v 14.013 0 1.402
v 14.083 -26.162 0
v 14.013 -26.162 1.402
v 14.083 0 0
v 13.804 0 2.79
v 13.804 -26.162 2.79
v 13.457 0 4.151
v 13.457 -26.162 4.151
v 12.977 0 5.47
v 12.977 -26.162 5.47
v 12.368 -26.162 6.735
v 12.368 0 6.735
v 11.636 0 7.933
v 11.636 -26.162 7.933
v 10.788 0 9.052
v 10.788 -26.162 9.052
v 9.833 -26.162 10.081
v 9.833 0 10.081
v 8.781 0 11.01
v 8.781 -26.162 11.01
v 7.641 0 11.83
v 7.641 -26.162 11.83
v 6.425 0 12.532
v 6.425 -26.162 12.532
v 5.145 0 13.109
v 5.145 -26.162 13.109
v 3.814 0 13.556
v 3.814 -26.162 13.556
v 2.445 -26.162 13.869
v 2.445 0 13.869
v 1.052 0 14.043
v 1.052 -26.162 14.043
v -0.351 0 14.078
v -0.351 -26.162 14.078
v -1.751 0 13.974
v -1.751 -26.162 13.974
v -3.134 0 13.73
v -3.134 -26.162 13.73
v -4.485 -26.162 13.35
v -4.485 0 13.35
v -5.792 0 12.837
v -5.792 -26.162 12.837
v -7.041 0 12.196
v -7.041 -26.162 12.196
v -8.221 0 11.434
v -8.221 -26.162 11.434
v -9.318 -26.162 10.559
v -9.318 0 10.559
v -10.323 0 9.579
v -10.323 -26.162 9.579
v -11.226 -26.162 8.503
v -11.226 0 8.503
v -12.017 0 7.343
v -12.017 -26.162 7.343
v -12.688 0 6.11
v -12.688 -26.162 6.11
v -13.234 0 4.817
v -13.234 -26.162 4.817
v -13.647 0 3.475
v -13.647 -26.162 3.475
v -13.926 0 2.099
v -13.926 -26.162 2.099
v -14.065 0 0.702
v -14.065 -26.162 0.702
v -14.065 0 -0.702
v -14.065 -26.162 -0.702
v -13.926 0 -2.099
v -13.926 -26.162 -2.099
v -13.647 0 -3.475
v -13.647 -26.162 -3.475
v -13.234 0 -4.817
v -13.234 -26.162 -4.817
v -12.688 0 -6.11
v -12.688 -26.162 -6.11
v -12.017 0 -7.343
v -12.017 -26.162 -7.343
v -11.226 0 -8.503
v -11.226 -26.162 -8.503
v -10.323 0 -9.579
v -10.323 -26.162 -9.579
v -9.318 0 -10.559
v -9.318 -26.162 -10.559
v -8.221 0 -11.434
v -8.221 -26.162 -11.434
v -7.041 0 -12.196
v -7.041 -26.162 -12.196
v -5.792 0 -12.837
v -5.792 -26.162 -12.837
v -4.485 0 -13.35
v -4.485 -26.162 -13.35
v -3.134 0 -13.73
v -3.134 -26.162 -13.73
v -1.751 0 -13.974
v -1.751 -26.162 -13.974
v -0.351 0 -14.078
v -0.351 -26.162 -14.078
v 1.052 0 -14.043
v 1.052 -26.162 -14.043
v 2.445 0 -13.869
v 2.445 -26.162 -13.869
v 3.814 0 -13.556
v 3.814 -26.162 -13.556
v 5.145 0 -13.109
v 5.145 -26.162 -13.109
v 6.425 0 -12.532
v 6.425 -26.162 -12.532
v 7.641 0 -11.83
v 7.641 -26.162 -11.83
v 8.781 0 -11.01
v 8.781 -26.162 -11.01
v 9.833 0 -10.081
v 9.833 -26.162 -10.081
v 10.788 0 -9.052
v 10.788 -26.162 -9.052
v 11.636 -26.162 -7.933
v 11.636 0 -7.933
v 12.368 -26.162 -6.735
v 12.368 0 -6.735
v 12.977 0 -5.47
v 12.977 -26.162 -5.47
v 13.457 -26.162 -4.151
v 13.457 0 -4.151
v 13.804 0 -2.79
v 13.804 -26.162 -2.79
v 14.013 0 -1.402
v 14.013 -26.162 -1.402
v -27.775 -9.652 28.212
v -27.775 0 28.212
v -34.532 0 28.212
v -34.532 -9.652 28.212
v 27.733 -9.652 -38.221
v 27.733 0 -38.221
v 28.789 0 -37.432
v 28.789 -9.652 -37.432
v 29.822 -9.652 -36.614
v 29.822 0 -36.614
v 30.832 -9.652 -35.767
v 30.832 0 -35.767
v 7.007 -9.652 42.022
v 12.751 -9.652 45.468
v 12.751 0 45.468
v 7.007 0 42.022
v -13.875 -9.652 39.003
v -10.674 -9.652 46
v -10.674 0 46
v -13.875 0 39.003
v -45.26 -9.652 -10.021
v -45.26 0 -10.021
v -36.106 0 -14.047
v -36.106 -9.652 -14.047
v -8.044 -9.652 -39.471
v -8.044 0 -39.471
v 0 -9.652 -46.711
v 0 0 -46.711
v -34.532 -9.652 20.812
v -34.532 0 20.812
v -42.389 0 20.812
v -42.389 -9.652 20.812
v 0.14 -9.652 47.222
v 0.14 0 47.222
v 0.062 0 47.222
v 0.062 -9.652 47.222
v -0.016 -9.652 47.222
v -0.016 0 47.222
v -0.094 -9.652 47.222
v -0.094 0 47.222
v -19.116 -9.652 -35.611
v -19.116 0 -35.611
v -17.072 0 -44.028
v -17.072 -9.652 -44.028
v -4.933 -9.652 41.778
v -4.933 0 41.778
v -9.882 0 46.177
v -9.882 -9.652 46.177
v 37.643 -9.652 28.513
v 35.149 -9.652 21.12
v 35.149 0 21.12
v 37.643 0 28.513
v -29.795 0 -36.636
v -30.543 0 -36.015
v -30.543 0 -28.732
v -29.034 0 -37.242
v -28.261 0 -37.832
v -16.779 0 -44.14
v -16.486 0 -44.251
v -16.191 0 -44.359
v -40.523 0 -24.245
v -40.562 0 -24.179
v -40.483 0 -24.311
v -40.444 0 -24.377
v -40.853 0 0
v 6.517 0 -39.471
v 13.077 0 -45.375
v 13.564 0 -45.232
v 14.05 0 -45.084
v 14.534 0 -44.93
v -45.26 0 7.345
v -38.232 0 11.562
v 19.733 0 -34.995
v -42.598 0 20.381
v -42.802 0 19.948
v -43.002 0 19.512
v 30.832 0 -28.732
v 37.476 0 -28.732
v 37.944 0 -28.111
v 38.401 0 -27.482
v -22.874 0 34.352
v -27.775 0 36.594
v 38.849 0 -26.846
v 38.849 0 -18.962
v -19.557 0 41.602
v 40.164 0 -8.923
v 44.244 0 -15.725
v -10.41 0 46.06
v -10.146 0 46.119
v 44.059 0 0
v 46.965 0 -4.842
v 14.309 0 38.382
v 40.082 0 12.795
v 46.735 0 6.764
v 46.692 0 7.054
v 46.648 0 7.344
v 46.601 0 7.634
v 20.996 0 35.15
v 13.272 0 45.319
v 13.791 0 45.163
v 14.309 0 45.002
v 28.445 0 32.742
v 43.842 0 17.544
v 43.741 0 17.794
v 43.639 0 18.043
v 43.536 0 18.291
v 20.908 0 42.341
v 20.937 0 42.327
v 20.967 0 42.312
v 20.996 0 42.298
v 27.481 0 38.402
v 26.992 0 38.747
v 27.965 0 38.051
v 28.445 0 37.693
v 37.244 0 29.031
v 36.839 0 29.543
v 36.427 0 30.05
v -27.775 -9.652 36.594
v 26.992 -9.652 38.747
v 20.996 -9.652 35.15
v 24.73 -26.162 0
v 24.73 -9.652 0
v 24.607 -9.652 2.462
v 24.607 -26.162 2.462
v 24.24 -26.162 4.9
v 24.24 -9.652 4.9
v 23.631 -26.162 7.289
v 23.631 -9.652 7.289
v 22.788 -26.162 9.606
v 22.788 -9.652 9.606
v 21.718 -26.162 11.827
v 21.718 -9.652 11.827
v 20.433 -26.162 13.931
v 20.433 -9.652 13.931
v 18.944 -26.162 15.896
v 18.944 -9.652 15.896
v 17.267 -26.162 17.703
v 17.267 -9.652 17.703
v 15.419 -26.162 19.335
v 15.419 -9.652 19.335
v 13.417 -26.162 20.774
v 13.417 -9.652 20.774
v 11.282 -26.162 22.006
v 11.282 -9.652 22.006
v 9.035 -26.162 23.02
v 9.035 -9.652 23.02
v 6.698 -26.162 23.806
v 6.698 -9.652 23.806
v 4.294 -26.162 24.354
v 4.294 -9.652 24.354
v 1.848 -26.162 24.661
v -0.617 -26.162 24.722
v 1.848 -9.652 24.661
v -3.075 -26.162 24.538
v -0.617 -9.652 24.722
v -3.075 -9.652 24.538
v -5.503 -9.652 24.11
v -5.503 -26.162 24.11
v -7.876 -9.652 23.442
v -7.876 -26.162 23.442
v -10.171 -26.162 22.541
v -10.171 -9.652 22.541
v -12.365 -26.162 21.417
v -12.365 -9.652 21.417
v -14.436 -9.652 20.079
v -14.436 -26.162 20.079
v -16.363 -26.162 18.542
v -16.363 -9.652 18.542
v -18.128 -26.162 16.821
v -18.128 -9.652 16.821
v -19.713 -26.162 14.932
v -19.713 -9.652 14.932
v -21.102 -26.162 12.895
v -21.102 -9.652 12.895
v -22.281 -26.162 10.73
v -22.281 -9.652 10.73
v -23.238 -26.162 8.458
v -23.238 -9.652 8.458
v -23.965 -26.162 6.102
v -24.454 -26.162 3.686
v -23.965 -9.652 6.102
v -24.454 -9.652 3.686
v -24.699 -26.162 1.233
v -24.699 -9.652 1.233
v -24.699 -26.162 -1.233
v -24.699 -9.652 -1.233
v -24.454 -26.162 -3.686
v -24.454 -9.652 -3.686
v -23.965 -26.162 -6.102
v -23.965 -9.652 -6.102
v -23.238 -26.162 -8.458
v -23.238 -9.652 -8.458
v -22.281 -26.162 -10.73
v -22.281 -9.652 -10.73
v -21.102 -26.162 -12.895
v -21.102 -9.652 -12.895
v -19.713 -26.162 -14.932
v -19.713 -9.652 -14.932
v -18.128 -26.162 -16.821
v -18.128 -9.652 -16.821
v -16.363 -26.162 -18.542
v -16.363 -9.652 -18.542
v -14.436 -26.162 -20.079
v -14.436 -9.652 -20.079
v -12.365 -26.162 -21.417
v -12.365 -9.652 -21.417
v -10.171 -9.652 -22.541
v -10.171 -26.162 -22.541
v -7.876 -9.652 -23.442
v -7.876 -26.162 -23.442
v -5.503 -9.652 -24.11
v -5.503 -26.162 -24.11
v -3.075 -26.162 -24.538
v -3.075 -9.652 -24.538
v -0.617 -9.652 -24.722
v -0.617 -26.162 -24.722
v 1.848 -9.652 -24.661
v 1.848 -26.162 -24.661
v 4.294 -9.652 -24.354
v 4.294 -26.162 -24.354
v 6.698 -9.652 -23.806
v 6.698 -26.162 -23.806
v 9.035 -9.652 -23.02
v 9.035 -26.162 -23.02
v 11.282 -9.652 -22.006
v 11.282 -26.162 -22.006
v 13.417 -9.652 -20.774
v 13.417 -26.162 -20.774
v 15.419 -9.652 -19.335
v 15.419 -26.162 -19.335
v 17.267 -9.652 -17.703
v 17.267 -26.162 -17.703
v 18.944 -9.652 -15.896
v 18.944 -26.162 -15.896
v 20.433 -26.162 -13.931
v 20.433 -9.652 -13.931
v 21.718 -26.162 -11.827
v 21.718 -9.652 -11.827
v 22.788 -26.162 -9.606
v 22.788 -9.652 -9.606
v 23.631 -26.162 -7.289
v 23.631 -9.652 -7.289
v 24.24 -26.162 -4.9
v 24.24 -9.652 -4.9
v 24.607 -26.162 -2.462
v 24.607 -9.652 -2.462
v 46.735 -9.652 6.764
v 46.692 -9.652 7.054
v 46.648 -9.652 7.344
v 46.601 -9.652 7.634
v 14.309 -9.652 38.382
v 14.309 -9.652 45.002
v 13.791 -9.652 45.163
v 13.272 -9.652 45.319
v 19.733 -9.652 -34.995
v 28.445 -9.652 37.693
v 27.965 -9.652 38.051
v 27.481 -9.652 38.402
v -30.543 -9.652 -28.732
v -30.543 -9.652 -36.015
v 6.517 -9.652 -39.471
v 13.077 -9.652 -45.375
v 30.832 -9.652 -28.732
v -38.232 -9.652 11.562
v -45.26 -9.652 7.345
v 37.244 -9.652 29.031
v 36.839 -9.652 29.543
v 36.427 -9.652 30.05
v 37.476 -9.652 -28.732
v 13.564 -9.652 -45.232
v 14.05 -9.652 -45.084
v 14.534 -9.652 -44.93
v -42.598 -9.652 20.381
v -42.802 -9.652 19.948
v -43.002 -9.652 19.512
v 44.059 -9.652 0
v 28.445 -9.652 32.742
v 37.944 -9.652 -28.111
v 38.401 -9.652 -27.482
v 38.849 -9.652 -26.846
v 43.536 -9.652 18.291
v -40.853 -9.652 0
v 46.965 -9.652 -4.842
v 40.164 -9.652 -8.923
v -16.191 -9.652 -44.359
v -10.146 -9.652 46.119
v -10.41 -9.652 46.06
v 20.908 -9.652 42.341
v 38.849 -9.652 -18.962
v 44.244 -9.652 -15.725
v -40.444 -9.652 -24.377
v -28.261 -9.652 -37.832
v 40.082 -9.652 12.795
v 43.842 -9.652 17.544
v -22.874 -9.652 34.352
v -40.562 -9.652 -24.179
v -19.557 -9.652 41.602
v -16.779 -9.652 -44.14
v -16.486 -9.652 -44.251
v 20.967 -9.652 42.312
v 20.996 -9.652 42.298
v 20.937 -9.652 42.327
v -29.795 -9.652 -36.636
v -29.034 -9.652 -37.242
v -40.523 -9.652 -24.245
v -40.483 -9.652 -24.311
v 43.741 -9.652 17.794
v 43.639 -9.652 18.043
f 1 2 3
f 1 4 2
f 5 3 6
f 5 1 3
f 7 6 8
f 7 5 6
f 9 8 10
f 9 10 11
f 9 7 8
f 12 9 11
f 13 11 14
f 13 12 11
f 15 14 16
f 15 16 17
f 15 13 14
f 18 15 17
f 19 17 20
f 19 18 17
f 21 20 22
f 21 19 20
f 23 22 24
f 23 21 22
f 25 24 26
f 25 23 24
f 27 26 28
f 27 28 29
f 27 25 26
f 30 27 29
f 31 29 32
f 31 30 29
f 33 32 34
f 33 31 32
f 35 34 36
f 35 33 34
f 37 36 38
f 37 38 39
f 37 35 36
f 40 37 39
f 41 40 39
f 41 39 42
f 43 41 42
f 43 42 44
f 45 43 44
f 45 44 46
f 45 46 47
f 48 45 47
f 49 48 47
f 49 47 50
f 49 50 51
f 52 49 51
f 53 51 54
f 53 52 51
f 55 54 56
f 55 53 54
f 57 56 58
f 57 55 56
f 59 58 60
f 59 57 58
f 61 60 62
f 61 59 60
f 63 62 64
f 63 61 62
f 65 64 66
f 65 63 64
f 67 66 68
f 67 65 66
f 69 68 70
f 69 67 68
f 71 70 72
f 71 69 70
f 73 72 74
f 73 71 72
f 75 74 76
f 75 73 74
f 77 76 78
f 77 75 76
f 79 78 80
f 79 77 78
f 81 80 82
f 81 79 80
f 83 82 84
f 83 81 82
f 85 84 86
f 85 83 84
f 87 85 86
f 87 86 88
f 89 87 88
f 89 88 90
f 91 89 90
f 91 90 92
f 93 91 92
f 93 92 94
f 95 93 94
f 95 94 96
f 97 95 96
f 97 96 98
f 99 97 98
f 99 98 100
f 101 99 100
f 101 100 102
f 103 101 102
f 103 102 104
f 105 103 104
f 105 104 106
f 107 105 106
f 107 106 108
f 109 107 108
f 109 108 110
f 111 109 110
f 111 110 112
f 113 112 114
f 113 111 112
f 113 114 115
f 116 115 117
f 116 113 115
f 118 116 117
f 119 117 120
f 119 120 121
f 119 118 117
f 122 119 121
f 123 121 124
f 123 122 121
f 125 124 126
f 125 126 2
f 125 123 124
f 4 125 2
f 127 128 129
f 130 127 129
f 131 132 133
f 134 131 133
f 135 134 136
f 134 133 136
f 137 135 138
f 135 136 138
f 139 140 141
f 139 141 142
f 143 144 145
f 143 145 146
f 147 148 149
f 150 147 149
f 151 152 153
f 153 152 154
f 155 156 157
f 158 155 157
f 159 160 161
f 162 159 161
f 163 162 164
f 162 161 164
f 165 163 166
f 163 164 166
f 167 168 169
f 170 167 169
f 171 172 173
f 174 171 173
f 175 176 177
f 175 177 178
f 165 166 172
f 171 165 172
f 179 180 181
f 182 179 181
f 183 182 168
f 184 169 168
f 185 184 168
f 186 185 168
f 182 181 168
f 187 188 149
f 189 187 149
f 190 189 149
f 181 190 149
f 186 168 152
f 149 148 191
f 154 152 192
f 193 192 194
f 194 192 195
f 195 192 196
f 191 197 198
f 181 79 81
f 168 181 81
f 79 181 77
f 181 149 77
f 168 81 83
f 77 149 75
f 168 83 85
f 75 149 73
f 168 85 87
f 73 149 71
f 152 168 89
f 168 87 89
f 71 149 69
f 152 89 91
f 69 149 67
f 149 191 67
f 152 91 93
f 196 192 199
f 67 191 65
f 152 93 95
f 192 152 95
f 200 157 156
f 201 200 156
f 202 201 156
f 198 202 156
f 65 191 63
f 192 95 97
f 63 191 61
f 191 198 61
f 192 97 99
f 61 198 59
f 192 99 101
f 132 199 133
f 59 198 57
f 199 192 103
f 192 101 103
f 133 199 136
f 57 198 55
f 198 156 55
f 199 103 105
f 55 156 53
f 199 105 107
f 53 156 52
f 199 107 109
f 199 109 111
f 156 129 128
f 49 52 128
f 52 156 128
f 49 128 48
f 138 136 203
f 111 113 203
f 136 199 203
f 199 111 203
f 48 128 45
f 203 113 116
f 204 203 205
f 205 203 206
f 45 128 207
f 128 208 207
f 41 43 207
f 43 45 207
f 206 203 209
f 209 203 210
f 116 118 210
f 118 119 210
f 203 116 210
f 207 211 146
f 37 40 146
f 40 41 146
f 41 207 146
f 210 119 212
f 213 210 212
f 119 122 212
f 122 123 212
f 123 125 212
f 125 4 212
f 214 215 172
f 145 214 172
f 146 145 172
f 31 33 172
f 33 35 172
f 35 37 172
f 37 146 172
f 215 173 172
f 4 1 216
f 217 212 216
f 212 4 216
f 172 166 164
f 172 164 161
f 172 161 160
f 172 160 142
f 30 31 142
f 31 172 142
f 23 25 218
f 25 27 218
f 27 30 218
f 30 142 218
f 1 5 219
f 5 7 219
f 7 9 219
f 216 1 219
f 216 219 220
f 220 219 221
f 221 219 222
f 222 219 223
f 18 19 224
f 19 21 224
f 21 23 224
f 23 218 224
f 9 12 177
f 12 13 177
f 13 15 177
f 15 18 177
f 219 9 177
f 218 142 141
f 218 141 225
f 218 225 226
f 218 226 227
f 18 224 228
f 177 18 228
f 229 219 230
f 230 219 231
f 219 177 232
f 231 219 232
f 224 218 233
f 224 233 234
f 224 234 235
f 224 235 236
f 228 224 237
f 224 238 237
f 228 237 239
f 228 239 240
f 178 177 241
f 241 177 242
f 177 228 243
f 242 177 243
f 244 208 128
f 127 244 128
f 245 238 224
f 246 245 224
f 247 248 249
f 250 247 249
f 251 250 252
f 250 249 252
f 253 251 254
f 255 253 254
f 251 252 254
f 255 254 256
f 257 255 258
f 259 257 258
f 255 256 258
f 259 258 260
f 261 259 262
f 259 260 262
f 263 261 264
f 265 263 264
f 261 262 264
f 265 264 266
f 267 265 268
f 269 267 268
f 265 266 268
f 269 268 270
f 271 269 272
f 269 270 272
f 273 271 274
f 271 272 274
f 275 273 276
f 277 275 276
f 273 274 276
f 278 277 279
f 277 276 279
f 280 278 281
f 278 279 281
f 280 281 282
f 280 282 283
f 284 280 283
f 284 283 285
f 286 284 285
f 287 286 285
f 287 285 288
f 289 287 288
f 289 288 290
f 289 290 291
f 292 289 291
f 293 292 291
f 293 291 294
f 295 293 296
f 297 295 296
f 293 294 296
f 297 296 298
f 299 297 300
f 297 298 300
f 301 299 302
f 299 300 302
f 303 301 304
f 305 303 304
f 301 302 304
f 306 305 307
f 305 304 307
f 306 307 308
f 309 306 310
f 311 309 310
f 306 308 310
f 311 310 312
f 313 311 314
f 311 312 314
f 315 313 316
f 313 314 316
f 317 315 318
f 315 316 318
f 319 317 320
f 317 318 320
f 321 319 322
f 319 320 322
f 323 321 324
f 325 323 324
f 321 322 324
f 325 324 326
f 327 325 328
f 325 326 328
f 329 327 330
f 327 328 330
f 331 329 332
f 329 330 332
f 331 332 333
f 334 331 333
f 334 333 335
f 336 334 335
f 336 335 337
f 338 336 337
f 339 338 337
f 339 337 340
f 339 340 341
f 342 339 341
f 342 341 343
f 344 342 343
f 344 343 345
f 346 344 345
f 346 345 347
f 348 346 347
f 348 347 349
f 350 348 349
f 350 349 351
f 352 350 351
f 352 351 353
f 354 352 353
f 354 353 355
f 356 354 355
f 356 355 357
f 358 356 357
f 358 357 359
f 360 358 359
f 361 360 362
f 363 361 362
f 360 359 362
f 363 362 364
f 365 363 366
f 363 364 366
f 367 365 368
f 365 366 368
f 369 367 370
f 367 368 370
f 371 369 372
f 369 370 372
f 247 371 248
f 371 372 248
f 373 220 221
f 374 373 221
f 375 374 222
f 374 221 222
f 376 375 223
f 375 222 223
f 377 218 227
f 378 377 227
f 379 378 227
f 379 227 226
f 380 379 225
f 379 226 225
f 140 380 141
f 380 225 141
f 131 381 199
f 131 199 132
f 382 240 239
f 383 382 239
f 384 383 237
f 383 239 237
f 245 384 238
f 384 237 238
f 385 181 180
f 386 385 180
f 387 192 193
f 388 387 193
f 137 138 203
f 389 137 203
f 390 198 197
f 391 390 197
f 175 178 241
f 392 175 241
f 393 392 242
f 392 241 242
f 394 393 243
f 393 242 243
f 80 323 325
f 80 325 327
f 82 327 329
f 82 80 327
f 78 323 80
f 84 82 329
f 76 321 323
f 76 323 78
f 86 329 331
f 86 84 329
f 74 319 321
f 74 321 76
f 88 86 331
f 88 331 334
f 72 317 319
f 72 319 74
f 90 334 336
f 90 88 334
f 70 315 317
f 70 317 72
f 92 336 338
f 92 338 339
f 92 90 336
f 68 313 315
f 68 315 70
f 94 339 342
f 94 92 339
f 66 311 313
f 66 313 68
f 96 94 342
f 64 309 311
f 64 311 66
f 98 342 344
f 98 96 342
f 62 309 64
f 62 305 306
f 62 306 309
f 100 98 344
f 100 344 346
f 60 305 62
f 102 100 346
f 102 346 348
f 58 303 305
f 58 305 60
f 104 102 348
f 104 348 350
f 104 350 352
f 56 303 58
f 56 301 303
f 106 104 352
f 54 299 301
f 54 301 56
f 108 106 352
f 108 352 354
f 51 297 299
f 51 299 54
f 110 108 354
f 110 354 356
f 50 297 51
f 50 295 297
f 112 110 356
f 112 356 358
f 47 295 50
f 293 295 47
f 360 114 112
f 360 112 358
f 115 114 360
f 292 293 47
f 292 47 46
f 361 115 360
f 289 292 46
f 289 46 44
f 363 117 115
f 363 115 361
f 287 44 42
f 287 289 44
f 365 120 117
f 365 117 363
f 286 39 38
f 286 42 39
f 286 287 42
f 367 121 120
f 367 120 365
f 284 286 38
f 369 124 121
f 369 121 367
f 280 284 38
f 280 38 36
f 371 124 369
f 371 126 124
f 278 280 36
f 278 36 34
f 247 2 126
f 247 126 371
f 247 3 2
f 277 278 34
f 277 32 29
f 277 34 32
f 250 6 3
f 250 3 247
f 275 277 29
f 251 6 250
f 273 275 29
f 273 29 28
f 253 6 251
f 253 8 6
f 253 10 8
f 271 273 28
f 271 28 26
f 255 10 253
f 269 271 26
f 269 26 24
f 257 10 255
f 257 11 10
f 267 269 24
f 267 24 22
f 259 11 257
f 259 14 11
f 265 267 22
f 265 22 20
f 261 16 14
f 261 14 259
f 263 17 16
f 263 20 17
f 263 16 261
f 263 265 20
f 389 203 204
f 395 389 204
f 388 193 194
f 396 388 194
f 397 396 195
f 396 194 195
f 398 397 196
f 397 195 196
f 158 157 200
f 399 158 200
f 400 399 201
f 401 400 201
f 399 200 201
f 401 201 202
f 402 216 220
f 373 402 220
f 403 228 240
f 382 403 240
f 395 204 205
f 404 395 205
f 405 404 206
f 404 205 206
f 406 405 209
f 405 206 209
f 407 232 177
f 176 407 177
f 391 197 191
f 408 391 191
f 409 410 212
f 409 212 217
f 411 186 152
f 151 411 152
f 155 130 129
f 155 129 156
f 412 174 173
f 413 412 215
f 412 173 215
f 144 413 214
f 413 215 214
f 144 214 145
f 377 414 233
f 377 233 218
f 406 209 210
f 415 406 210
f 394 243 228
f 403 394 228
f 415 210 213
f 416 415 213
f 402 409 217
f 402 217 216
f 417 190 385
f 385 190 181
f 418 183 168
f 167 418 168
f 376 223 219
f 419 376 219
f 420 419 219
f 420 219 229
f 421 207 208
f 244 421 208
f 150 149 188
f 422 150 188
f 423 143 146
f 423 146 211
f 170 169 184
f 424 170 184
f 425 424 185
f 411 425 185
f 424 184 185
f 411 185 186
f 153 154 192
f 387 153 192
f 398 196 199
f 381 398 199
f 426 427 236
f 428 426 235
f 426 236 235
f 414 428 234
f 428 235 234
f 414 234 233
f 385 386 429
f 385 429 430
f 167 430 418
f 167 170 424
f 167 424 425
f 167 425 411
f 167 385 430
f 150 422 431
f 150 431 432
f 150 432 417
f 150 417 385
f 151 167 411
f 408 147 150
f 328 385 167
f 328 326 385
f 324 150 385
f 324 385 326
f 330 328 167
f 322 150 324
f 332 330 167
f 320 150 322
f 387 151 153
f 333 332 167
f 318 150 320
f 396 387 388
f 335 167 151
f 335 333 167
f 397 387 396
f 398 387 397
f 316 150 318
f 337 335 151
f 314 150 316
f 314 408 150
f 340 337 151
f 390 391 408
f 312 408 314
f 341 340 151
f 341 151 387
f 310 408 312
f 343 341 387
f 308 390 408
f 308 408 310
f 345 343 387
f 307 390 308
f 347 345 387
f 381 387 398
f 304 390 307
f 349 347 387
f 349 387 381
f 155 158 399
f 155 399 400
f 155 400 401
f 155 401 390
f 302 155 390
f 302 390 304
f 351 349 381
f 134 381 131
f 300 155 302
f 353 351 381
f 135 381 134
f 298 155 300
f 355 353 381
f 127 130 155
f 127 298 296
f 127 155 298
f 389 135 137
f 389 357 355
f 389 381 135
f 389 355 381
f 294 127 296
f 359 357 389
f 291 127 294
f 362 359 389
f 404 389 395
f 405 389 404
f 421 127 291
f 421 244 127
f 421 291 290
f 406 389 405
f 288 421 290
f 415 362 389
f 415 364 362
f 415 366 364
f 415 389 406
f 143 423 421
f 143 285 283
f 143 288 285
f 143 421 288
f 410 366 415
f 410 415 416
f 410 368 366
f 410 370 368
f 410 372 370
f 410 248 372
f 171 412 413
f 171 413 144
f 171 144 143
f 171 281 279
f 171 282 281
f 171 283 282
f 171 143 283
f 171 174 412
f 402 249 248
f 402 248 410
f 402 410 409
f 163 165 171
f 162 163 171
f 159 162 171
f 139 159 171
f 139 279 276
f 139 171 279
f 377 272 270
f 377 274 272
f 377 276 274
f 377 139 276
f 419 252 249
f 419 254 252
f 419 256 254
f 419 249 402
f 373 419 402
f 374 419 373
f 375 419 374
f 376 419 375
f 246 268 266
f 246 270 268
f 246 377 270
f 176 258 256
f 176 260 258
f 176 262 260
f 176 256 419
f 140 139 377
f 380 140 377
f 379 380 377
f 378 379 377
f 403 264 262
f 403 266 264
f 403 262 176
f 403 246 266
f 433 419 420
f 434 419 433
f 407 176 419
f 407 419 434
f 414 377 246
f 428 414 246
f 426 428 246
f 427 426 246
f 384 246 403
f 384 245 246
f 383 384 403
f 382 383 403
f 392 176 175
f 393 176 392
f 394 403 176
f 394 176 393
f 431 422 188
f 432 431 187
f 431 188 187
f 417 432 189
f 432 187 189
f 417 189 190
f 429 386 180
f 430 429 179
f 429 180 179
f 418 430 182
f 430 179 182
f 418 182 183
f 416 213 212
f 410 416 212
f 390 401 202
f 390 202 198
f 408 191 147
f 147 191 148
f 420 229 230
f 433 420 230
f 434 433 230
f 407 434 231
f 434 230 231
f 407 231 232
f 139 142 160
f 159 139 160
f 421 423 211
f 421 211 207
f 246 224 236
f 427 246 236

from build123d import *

# Parameters (mm, degrees)
F0_R     = 47.222118
F0_R_2   = 26.321979
F0_R_3   = 14.082834
F1_DEPTH = 9.652
F2_R     = 24.729886
F2_R_2   = 14.082834
F3_DEPTH = 16.51
F5_DEPTH = 58.166


with BuildPart() as f1:
    # F0 (on Front) → F1 (new body)
    with BuildSketch(Plane.XZ):
        Circle(F0_R)
        Circle(F0_R_2, mode=Mode.SUBTRACT)
        Circle(F0_R_2)
        Circle(F0_R_3, mode=Mode.SUBTRACT)
    extrude(amount=F1_DEPTH)

    # F2 (on face) → F3 (join)
    with BuildSketch(Plane.XZ.offset(9.652)):
        Circle(F2_R)
        Circle(F2_R_2, mode=Mode.SUBTRACT)
    extrude(amount=F3_DEPTH)

    # F4 (on Front) → F5 (intersect)
    with BuildSketch(Plane.XZ):
        Polygon((7.006876, 42.021585), (0, 47.32769), (-4.933179, 41.77786), (-10.38732, 46.625983), (-13.874567, 39.002948), (-19.557085, 41.602482), (-22.87385, 34.352116), (-27.775111, 36.594255), (-27.775111, 28.21162), (-34.532256, 28.21162), (-34.532256, 20.81185), (-43.781966, 20.81185), (-38.23214, 11.562139), (-45.260107, 7.34536), (-40.852892, 0), (-45.260107, -10.020521), (-36.106034, -14.046655), (-40.616142, -24.30112), (-30.542885, -28.731529), (-30.542885, -38.3863), (-19.11607, -35.611387), (-16.889893, -44.778563), (-8.043921, -39.47098), (0, -46.711039), (6.51653, -39.47098), (13.908958, -46.124652), (19.732716, -34.99474), (30.832369, -39.47098), (30.832369, -28.731529), (38.848784, -28.731529), (38.848784, -18.961906), (44.244453, -15.724506), (40.163699, -8.923248), (46.964957, -4.842494), (44.059461, 0), (46.964957, 7.34536), (40.082078, 12.795433), (44.244453, 18.052081), (35.1489, 21.120174), (37.983977, 29.524937), (28.44544, 32.742457), (28.44544, 39.619595), (20.996165, 35.150031), (20.996165, 42.394508), (14.308761, 38.382066), (14.308761, 46.402715), align=None)
    extrude(amount=F5_DEPTH, mode=Mode.INTERSECT)


solid = f1.part
